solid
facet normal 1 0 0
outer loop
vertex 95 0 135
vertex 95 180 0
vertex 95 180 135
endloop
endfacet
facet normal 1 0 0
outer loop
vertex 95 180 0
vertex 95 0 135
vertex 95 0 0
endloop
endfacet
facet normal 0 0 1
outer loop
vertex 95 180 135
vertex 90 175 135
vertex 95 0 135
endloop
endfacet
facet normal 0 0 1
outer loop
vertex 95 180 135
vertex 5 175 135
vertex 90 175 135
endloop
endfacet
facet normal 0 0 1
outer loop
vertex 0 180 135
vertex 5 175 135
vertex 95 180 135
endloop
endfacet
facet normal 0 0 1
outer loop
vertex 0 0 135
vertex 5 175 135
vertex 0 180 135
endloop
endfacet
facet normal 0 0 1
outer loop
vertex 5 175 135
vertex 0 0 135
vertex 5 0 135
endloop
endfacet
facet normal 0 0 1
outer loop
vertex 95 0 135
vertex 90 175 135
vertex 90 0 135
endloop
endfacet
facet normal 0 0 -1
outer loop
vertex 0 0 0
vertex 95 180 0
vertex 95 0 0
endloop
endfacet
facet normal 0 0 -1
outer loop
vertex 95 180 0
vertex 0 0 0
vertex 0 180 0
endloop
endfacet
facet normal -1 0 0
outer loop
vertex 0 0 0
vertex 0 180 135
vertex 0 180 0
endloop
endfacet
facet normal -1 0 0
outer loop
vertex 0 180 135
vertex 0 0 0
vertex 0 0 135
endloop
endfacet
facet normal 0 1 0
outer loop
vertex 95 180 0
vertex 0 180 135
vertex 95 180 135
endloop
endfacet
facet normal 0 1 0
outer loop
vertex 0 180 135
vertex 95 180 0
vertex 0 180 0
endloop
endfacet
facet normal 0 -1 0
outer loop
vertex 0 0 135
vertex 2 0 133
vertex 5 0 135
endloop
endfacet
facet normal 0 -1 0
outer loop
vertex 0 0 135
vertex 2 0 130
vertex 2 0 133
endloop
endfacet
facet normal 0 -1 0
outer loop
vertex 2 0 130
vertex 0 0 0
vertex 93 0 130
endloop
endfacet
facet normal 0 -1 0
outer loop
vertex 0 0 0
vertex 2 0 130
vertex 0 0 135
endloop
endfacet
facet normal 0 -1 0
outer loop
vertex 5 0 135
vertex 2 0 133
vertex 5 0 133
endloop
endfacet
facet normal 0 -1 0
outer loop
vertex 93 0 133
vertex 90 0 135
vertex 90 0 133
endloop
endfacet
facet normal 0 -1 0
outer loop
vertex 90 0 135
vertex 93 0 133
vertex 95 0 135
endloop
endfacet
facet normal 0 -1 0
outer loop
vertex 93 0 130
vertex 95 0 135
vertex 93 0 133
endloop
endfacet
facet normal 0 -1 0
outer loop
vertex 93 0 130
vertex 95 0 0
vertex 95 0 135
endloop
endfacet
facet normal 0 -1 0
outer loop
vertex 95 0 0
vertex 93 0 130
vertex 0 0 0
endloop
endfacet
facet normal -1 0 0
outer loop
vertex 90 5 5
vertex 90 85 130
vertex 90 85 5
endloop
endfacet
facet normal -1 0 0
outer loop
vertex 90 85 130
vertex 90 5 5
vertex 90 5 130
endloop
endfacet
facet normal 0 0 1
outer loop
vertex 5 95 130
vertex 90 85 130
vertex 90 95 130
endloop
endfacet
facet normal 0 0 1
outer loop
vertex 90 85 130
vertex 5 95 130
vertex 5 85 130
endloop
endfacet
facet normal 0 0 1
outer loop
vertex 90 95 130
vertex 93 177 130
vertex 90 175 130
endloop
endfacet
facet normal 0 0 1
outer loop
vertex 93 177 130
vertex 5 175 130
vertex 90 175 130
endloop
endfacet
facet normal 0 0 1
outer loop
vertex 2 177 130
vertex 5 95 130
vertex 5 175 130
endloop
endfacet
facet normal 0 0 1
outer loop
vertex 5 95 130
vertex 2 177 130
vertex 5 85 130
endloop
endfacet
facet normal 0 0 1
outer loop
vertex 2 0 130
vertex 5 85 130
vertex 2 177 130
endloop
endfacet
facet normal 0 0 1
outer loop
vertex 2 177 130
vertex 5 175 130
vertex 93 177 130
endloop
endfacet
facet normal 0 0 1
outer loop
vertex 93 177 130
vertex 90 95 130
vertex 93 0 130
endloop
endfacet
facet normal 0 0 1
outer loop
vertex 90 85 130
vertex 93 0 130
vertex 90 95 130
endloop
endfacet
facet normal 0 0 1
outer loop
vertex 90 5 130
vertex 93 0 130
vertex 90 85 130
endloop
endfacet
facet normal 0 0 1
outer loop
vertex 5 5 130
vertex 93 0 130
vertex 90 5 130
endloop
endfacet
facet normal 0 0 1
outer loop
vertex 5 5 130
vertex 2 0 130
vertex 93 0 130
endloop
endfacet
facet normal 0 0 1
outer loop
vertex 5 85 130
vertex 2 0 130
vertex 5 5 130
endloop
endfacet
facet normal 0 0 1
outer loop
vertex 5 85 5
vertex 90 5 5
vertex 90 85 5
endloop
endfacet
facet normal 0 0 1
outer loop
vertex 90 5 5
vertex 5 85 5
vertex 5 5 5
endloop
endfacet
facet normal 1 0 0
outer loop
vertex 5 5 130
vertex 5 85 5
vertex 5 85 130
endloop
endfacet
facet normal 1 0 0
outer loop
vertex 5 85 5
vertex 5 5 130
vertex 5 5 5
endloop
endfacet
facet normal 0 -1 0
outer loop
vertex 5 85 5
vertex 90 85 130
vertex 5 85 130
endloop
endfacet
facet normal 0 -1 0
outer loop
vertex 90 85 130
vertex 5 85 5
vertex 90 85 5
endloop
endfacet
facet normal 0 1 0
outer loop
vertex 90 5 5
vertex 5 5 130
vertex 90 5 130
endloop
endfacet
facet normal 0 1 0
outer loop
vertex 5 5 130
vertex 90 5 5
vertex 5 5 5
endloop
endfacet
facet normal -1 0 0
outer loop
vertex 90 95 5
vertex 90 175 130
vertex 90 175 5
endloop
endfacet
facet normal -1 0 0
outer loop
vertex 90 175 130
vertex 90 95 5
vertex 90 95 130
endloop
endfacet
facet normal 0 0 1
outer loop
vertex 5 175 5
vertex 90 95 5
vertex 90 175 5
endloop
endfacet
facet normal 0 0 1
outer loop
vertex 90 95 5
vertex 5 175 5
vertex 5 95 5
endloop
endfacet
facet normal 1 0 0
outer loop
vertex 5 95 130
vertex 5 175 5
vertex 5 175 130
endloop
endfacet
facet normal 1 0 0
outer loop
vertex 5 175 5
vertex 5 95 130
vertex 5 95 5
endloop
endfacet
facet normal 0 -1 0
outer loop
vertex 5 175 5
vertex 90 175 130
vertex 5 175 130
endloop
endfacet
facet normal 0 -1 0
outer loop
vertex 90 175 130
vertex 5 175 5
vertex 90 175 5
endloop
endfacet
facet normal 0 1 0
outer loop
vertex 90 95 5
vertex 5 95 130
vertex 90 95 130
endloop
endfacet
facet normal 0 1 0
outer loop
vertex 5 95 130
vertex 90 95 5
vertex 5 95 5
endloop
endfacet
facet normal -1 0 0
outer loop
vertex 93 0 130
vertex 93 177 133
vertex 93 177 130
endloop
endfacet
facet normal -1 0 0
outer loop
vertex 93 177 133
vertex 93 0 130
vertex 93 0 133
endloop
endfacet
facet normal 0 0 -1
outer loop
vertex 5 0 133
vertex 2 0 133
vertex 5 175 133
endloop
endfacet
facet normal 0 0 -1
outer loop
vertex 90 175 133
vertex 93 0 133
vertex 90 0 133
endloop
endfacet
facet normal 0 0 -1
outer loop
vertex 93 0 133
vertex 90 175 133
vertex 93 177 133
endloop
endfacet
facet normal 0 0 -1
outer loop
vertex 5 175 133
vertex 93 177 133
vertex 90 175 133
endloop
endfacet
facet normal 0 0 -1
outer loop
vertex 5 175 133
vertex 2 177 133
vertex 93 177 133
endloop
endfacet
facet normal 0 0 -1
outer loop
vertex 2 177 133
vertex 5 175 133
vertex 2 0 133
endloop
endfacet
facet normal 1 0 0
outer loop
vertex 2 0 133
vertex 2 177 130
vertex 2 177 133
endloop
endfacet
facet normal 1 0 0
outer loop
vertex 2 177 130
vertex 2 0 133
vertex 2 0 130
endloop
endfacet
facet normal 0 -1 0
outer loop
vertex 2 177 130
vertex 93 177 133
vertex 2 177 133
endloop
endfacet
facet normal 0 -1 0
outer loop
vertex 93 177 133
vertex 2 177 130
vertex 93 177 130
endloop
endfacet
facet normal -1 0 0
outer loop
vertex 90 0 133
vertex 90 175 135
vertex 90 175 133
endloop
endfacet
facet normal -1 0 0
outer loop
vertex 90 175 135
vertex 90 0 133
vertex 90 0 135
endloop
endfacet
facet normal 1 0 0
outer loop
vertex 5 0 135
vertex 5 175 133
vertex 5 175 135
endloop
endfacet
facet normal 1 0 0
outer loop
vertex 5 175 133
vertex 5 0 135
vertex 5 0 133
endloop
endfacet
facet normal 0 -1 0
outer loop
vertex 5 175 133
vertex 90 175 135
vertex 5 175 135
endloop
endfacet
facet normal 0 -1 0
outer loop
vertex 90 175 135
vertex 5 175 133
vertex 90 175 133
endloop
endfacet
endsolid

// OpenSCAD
$fn=360;
//67x93x22
//cards = 85x125x10
x=95;
y=180;
z=135;
cardx=85;
cardy=85;
cardz=125;
base=31;

difference() {
    translate([0,0,0])
    cube([x,y,z]);
    //cards gap1
    translate([x-90,5,5])
    cube([cardx,cardy-5,cardz]);
    //cards gap2
    translate([x-90,y/2+5,5])
    cube([cardx,cardy-5,cardz]);
    //lid gaps
    translate([2,0,z-5])
    cube([x-4,y-3,3]);
    translate([5,0,z-4])
    cube([x-10,y-5,5]);
}
